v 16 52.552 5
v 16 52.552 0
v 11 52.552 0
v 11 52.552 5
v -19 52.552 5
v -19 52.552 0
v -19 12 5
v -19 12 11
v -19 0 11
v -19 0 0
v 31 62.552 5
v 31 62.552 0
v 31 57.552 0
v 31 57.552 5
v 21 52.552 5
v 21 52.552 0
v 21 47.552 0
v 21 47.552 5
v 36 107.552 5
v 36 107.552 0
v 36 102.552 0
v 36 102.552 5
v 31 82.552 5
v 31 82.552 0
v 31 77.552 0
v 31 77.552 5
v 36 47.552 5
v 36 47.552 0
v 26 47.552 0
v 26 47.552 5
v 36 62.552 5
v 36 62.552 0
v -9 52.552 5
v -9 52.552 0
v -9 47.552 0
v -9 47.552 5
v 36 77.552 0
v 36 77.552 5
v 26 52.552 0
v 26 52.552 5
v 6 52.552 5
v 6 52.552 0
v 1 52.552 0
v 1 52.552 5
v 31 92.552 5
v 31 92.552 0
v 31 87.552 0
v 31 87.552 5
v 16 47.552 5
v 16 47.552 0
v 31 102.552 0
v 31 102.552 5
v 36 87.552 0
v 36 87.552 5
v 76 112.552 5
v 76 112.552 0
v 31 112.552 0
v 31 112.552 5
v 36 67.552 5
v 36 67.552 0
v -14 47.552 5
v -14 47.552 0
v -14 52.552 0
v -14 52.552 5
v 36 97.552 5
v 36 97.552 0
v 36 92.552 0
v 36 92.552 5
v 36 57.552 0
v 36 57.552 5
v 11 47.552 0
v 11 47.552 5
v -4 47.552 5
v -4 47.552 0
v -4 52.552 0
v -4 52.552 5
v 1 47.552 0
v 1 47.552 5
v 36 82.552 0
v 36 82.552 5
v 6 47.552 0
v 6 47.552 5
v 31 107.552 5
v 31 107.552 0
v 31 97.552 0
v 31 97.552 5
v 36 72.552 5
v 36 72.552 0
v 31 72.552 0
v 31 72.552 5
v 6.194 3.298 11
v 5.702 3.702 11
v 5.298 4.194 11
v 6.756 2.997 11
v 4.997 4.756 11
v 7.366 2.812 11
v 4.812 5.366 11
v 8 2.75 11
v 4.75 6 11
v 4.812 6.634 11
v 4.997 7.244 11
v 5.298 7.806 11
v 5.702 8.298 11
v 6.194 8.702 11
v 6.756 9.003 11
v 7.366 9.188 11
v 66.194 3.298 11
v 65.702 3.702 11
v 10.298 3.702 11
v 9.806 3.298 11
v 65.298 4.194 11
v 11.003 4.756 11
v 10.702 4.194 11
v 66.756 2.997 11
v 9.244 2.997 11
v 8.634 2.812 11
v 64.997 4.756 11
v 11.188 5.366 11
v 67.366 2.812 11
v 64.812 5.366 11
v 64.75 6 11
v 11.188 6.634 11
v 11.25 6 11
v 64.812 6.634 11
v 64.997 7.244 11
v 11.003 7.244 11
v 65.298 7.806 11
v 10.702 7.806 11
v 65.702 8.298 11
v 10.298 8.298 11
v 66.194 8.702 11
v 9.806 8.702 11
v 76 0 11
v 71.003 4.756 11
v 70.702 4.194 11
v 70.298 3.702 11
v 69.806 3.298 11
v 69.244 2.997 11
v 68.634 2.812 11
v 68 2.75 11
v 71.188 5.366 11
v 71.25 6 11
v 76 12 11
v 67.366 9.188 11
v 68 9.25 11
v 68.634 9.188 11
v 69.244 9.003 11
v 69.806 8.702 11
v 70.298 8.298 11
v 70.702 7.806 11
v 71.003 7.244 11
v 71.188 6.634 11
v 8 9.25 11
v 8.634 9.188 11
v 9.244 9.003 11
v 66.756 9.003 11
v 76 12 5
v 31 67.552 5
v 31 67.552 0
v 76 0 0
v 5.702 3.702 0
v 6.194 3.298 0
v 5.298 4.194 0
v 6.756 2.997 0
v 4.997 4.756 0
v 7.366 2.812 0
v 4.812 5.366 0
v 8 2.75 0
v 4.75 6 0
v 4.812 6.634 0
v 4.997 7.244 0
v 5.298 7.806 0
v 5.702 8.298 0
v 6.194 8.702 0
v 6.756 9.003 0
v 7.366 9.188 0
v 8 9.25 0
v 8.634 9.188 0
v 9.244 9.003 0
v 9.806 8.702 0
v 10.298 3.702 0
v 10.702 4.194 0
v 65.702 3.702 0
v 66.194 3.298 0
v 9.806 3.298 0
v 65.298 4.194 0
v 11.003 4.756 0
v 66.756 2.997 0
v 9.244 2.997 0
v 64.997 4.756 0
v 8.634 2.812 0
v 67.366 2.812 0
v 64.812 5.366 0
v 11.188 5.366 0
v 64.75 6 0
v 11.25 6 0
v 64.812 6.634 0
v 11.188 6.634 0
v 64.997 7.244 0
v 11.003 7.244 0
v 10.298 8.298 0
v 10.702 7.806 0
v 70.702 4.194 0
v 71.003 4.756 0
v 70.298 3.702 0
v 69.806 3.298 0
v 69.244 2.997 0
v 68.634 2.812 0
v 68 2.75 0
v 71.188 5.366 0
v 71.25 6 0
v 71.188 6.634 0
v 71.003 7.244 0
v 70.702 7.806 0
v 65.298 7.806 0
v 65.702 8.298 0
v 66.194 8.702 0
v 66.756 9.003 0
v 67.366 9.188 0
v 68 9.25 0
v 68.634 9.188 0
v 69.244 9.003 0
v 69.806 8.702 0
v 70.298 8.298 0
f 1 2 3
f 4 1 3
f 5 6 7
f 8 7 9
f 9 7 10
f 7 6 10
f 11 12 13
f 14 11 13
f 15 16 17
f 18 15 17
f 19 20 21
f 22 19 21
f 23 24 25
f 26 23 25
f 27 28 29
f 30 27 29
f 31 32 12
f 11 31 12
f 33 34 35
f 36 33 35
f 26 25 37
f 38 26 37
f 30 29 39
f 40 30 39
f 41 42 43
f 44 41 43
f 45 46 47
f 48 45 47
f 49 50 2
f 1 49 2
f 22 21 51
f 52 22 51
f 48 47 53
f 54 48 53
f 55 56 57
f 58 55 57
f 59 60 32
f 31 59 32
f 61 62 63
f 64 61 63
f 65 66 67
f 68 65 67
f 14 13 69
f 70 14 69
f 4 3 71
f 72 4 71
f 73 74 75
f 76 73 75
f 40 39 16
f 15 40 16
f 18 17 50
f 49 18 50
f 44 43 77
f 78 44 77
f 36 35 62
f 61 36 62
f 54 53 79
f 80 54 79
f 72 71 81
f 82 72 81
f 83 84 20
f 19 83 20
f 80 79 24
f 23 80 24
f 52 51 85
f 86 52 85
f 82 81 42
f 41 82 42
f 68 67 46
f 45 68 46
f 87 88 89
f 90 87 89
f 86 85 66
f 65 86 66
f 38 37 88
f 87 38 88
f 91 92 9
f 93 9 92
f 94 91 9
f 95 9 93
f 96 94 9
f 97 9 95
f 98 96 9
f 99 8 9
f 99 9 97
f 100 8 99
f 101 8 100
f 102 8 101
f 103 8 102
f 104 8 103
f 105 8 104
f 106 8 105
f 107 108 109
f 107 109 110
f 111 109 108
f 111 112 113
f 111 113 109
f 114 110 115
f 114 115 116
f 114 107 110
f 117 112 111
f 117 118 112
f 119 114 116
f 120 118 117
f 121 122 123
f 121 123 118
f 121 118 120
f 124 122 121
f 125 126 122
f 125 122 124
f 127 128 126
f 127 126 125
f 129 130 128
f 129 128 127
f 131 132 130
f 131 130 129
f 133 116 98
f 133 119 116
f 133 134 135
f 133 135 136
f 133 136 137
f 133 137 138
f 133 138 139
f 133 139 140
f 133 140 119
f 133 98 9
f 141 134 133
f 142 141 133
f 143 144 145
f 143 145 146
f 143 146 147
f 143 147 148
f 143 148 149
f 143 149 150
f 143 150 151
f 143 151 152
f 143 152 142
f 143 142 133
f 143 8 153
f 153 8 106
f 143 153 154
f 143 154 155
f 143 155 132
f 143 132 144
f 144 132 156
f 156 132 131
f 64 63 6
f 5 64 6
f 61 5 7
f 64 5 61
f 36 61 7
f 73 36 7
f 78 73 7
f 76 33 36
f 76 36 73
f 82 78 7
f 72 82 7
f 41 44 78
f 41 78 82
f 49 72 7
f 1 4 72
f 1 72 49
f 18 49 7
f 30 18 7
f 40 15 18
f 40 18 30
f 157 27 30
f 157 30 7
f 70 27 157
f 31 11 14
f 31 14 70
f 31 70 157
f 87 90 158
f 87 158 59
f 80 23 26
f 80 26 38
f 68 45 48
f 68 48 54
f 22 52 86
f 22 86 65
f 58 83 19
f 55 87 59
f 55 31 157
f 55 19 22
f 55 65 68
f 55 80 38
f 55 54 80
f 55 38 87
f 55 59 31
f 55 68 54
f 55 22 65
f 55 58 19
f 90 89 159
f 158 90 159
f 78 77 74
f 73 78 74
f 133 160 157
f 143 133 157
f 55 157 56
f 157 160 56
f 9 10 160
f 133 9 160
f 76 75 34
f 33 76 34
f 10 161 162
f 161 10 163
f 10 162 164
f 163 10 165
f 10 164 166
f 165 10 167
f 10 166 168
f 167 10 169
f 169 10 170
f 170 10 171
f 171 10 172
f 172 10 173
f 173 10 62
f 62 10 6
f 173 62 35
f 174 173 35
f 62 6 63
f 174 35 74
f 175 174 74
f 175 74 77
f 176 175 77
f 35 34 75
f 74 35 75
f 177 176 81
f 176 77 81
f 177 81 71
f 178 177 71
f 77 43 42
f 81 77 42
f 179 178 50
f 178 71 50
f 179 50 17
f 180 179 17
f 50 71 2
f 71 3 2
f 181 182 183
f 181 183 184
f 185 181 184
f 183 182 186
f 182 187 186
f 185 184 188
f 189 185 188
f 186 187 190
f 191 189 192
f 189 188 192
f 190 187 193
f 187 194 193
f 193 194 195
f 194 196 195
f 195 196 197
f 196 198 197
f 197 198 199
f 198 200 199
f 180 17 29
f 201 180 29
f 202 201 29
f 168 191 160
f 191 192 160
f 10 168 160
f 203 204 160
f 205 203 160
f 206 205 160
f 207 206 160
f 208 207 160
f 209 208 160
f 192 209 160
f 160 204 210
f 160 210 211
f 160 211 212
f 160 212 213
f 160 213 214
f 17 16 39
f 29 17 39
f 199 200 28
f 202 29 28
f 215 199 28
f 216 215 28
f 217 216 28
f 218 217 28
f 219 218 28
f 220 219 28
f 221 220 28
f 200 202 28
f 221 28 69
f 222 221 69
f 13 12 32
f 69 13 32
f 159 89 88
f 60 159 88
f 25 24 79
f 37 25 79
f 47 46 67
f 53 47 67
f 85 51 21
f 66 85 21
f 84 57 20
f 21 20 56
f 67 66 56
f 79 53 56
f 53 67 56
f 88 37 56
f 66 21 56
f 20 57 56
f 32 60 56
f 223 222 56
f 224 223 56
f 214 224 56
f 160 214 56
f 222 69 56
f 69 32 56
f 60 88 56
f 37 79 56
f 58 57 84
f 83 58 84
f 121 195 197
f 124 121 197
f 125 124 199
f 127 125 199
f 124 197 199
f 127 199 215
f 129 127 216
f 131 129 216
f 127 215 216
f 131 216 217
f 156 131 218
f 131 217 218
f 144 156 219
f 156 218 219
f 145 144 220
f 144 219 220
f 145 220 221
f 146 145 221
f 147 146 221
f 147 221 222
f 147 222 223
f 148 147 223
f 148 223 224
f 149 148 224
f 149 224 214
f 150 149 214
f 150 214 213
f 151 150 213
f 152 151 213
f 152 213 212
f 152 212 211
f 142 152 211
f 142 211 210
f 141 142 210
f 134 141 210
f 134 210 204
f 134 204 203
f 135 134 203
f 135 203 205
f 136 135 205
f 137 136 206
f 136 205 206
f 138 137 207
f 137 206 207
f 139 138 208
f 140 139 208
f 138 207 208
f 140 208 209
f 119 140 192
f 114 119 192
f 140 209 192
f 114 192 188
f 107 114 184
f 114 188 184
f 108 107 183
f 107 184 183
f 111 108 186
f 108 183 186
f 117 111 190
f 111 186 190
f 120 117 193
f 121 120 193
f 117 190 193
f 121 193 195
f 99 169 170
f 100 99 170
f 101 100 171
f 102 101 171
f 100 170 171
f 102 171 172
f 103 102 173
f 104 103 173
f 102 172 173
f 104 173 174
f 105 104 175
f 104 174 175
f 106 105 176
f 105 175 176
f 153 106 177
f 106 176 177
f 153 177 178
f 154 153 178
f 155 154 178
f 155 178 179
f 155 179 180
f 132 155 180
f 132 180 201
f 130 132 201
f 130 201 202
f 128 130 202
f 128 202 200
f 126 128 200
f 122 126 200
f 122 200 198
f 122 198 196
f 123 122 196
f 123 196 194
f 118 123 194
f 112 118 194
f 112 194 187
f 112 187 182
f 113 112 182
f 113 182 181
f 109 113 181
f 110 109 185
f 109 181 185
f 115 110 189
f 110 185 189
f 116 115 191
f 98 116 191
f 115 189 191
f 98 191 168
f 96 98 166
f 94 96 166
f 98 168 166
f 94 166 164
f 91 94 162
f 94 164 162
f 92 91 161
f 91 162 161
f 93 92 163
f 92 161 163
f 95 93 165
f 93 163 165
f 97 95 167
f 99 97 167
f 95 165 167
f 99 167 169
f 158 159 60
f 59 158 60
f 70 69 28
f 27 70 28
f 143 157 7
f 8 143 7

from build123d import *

# Parameters (mm, degrees)
F1_DEPTH = 11
F3_D     = 6.5
F4_D     = 6.5
F5_DEPTH = 5


with BuildPart() as f1:
    # F0 (on Top) → F1 (new body)
    with BuildSketch(Plane.XY):
        Polygon((-19, 0), (0, 0), (76, 0), (76, 12), (0, 12), (-19, 12), align=None)
    extrude(amount=F1_DEPTH)

    # F3 (through all)
    with Locations(Plane.XY.offset(11)):
        with Locations((8, 6)):
            Hole(F3_D / 2)

    # F4 (through all)
    with Locations(Plane.XY.offset(11)):
        with Locations((68, 6)):
            Hole(F4_D / 2)

    # F0 (on Top) → F5 (join)
    with BuildSketch(Plane.XY):
        Polygon((0, 12), (76, 12), (76, 52.551852), (76, 55), (76, 112.551852), (31, 112.551852), (31, 107.551852), (36, 107.551852), (36, 102.551852), (31, 102.551852), (31, 97.551852), (36, 97.551852), (36, 92.551852), (31, 92.551852), (31, 87.551852), (36, 87.551852), (36, 82.551852), (31, 82.551852), (31, 77.551852), (36, 77.551852), (36, 72.551852), (31, 72.551852), (31, 67.551852), (36, 67.551852), (36, 62.551852), (31, 62.551852), (31, 57.551852), (36, 57.551852), (36, 52.551852), (36, 47.551852), (26, 47.551852), (26, 52.551852), (21, 52.551852), (21, 47.551852), (16, 47.551852), (16, 52.551852), (11, 52.551852), (11, 47.551852), (6, 47.551852), (6, 52.551852), (1, 52.551852), (1, 47.551852), (-4, 47.551852), (-4, 52.551852), (-9, 52.551852), (-9, 47.551852), (-14, 47.551852), (-14, 52.551852), (-19, 52.551852), (-19, 47.551852), (-19, 12), align=None)
    extrude(amount=F5_DEPTH)


solid = f1.part
